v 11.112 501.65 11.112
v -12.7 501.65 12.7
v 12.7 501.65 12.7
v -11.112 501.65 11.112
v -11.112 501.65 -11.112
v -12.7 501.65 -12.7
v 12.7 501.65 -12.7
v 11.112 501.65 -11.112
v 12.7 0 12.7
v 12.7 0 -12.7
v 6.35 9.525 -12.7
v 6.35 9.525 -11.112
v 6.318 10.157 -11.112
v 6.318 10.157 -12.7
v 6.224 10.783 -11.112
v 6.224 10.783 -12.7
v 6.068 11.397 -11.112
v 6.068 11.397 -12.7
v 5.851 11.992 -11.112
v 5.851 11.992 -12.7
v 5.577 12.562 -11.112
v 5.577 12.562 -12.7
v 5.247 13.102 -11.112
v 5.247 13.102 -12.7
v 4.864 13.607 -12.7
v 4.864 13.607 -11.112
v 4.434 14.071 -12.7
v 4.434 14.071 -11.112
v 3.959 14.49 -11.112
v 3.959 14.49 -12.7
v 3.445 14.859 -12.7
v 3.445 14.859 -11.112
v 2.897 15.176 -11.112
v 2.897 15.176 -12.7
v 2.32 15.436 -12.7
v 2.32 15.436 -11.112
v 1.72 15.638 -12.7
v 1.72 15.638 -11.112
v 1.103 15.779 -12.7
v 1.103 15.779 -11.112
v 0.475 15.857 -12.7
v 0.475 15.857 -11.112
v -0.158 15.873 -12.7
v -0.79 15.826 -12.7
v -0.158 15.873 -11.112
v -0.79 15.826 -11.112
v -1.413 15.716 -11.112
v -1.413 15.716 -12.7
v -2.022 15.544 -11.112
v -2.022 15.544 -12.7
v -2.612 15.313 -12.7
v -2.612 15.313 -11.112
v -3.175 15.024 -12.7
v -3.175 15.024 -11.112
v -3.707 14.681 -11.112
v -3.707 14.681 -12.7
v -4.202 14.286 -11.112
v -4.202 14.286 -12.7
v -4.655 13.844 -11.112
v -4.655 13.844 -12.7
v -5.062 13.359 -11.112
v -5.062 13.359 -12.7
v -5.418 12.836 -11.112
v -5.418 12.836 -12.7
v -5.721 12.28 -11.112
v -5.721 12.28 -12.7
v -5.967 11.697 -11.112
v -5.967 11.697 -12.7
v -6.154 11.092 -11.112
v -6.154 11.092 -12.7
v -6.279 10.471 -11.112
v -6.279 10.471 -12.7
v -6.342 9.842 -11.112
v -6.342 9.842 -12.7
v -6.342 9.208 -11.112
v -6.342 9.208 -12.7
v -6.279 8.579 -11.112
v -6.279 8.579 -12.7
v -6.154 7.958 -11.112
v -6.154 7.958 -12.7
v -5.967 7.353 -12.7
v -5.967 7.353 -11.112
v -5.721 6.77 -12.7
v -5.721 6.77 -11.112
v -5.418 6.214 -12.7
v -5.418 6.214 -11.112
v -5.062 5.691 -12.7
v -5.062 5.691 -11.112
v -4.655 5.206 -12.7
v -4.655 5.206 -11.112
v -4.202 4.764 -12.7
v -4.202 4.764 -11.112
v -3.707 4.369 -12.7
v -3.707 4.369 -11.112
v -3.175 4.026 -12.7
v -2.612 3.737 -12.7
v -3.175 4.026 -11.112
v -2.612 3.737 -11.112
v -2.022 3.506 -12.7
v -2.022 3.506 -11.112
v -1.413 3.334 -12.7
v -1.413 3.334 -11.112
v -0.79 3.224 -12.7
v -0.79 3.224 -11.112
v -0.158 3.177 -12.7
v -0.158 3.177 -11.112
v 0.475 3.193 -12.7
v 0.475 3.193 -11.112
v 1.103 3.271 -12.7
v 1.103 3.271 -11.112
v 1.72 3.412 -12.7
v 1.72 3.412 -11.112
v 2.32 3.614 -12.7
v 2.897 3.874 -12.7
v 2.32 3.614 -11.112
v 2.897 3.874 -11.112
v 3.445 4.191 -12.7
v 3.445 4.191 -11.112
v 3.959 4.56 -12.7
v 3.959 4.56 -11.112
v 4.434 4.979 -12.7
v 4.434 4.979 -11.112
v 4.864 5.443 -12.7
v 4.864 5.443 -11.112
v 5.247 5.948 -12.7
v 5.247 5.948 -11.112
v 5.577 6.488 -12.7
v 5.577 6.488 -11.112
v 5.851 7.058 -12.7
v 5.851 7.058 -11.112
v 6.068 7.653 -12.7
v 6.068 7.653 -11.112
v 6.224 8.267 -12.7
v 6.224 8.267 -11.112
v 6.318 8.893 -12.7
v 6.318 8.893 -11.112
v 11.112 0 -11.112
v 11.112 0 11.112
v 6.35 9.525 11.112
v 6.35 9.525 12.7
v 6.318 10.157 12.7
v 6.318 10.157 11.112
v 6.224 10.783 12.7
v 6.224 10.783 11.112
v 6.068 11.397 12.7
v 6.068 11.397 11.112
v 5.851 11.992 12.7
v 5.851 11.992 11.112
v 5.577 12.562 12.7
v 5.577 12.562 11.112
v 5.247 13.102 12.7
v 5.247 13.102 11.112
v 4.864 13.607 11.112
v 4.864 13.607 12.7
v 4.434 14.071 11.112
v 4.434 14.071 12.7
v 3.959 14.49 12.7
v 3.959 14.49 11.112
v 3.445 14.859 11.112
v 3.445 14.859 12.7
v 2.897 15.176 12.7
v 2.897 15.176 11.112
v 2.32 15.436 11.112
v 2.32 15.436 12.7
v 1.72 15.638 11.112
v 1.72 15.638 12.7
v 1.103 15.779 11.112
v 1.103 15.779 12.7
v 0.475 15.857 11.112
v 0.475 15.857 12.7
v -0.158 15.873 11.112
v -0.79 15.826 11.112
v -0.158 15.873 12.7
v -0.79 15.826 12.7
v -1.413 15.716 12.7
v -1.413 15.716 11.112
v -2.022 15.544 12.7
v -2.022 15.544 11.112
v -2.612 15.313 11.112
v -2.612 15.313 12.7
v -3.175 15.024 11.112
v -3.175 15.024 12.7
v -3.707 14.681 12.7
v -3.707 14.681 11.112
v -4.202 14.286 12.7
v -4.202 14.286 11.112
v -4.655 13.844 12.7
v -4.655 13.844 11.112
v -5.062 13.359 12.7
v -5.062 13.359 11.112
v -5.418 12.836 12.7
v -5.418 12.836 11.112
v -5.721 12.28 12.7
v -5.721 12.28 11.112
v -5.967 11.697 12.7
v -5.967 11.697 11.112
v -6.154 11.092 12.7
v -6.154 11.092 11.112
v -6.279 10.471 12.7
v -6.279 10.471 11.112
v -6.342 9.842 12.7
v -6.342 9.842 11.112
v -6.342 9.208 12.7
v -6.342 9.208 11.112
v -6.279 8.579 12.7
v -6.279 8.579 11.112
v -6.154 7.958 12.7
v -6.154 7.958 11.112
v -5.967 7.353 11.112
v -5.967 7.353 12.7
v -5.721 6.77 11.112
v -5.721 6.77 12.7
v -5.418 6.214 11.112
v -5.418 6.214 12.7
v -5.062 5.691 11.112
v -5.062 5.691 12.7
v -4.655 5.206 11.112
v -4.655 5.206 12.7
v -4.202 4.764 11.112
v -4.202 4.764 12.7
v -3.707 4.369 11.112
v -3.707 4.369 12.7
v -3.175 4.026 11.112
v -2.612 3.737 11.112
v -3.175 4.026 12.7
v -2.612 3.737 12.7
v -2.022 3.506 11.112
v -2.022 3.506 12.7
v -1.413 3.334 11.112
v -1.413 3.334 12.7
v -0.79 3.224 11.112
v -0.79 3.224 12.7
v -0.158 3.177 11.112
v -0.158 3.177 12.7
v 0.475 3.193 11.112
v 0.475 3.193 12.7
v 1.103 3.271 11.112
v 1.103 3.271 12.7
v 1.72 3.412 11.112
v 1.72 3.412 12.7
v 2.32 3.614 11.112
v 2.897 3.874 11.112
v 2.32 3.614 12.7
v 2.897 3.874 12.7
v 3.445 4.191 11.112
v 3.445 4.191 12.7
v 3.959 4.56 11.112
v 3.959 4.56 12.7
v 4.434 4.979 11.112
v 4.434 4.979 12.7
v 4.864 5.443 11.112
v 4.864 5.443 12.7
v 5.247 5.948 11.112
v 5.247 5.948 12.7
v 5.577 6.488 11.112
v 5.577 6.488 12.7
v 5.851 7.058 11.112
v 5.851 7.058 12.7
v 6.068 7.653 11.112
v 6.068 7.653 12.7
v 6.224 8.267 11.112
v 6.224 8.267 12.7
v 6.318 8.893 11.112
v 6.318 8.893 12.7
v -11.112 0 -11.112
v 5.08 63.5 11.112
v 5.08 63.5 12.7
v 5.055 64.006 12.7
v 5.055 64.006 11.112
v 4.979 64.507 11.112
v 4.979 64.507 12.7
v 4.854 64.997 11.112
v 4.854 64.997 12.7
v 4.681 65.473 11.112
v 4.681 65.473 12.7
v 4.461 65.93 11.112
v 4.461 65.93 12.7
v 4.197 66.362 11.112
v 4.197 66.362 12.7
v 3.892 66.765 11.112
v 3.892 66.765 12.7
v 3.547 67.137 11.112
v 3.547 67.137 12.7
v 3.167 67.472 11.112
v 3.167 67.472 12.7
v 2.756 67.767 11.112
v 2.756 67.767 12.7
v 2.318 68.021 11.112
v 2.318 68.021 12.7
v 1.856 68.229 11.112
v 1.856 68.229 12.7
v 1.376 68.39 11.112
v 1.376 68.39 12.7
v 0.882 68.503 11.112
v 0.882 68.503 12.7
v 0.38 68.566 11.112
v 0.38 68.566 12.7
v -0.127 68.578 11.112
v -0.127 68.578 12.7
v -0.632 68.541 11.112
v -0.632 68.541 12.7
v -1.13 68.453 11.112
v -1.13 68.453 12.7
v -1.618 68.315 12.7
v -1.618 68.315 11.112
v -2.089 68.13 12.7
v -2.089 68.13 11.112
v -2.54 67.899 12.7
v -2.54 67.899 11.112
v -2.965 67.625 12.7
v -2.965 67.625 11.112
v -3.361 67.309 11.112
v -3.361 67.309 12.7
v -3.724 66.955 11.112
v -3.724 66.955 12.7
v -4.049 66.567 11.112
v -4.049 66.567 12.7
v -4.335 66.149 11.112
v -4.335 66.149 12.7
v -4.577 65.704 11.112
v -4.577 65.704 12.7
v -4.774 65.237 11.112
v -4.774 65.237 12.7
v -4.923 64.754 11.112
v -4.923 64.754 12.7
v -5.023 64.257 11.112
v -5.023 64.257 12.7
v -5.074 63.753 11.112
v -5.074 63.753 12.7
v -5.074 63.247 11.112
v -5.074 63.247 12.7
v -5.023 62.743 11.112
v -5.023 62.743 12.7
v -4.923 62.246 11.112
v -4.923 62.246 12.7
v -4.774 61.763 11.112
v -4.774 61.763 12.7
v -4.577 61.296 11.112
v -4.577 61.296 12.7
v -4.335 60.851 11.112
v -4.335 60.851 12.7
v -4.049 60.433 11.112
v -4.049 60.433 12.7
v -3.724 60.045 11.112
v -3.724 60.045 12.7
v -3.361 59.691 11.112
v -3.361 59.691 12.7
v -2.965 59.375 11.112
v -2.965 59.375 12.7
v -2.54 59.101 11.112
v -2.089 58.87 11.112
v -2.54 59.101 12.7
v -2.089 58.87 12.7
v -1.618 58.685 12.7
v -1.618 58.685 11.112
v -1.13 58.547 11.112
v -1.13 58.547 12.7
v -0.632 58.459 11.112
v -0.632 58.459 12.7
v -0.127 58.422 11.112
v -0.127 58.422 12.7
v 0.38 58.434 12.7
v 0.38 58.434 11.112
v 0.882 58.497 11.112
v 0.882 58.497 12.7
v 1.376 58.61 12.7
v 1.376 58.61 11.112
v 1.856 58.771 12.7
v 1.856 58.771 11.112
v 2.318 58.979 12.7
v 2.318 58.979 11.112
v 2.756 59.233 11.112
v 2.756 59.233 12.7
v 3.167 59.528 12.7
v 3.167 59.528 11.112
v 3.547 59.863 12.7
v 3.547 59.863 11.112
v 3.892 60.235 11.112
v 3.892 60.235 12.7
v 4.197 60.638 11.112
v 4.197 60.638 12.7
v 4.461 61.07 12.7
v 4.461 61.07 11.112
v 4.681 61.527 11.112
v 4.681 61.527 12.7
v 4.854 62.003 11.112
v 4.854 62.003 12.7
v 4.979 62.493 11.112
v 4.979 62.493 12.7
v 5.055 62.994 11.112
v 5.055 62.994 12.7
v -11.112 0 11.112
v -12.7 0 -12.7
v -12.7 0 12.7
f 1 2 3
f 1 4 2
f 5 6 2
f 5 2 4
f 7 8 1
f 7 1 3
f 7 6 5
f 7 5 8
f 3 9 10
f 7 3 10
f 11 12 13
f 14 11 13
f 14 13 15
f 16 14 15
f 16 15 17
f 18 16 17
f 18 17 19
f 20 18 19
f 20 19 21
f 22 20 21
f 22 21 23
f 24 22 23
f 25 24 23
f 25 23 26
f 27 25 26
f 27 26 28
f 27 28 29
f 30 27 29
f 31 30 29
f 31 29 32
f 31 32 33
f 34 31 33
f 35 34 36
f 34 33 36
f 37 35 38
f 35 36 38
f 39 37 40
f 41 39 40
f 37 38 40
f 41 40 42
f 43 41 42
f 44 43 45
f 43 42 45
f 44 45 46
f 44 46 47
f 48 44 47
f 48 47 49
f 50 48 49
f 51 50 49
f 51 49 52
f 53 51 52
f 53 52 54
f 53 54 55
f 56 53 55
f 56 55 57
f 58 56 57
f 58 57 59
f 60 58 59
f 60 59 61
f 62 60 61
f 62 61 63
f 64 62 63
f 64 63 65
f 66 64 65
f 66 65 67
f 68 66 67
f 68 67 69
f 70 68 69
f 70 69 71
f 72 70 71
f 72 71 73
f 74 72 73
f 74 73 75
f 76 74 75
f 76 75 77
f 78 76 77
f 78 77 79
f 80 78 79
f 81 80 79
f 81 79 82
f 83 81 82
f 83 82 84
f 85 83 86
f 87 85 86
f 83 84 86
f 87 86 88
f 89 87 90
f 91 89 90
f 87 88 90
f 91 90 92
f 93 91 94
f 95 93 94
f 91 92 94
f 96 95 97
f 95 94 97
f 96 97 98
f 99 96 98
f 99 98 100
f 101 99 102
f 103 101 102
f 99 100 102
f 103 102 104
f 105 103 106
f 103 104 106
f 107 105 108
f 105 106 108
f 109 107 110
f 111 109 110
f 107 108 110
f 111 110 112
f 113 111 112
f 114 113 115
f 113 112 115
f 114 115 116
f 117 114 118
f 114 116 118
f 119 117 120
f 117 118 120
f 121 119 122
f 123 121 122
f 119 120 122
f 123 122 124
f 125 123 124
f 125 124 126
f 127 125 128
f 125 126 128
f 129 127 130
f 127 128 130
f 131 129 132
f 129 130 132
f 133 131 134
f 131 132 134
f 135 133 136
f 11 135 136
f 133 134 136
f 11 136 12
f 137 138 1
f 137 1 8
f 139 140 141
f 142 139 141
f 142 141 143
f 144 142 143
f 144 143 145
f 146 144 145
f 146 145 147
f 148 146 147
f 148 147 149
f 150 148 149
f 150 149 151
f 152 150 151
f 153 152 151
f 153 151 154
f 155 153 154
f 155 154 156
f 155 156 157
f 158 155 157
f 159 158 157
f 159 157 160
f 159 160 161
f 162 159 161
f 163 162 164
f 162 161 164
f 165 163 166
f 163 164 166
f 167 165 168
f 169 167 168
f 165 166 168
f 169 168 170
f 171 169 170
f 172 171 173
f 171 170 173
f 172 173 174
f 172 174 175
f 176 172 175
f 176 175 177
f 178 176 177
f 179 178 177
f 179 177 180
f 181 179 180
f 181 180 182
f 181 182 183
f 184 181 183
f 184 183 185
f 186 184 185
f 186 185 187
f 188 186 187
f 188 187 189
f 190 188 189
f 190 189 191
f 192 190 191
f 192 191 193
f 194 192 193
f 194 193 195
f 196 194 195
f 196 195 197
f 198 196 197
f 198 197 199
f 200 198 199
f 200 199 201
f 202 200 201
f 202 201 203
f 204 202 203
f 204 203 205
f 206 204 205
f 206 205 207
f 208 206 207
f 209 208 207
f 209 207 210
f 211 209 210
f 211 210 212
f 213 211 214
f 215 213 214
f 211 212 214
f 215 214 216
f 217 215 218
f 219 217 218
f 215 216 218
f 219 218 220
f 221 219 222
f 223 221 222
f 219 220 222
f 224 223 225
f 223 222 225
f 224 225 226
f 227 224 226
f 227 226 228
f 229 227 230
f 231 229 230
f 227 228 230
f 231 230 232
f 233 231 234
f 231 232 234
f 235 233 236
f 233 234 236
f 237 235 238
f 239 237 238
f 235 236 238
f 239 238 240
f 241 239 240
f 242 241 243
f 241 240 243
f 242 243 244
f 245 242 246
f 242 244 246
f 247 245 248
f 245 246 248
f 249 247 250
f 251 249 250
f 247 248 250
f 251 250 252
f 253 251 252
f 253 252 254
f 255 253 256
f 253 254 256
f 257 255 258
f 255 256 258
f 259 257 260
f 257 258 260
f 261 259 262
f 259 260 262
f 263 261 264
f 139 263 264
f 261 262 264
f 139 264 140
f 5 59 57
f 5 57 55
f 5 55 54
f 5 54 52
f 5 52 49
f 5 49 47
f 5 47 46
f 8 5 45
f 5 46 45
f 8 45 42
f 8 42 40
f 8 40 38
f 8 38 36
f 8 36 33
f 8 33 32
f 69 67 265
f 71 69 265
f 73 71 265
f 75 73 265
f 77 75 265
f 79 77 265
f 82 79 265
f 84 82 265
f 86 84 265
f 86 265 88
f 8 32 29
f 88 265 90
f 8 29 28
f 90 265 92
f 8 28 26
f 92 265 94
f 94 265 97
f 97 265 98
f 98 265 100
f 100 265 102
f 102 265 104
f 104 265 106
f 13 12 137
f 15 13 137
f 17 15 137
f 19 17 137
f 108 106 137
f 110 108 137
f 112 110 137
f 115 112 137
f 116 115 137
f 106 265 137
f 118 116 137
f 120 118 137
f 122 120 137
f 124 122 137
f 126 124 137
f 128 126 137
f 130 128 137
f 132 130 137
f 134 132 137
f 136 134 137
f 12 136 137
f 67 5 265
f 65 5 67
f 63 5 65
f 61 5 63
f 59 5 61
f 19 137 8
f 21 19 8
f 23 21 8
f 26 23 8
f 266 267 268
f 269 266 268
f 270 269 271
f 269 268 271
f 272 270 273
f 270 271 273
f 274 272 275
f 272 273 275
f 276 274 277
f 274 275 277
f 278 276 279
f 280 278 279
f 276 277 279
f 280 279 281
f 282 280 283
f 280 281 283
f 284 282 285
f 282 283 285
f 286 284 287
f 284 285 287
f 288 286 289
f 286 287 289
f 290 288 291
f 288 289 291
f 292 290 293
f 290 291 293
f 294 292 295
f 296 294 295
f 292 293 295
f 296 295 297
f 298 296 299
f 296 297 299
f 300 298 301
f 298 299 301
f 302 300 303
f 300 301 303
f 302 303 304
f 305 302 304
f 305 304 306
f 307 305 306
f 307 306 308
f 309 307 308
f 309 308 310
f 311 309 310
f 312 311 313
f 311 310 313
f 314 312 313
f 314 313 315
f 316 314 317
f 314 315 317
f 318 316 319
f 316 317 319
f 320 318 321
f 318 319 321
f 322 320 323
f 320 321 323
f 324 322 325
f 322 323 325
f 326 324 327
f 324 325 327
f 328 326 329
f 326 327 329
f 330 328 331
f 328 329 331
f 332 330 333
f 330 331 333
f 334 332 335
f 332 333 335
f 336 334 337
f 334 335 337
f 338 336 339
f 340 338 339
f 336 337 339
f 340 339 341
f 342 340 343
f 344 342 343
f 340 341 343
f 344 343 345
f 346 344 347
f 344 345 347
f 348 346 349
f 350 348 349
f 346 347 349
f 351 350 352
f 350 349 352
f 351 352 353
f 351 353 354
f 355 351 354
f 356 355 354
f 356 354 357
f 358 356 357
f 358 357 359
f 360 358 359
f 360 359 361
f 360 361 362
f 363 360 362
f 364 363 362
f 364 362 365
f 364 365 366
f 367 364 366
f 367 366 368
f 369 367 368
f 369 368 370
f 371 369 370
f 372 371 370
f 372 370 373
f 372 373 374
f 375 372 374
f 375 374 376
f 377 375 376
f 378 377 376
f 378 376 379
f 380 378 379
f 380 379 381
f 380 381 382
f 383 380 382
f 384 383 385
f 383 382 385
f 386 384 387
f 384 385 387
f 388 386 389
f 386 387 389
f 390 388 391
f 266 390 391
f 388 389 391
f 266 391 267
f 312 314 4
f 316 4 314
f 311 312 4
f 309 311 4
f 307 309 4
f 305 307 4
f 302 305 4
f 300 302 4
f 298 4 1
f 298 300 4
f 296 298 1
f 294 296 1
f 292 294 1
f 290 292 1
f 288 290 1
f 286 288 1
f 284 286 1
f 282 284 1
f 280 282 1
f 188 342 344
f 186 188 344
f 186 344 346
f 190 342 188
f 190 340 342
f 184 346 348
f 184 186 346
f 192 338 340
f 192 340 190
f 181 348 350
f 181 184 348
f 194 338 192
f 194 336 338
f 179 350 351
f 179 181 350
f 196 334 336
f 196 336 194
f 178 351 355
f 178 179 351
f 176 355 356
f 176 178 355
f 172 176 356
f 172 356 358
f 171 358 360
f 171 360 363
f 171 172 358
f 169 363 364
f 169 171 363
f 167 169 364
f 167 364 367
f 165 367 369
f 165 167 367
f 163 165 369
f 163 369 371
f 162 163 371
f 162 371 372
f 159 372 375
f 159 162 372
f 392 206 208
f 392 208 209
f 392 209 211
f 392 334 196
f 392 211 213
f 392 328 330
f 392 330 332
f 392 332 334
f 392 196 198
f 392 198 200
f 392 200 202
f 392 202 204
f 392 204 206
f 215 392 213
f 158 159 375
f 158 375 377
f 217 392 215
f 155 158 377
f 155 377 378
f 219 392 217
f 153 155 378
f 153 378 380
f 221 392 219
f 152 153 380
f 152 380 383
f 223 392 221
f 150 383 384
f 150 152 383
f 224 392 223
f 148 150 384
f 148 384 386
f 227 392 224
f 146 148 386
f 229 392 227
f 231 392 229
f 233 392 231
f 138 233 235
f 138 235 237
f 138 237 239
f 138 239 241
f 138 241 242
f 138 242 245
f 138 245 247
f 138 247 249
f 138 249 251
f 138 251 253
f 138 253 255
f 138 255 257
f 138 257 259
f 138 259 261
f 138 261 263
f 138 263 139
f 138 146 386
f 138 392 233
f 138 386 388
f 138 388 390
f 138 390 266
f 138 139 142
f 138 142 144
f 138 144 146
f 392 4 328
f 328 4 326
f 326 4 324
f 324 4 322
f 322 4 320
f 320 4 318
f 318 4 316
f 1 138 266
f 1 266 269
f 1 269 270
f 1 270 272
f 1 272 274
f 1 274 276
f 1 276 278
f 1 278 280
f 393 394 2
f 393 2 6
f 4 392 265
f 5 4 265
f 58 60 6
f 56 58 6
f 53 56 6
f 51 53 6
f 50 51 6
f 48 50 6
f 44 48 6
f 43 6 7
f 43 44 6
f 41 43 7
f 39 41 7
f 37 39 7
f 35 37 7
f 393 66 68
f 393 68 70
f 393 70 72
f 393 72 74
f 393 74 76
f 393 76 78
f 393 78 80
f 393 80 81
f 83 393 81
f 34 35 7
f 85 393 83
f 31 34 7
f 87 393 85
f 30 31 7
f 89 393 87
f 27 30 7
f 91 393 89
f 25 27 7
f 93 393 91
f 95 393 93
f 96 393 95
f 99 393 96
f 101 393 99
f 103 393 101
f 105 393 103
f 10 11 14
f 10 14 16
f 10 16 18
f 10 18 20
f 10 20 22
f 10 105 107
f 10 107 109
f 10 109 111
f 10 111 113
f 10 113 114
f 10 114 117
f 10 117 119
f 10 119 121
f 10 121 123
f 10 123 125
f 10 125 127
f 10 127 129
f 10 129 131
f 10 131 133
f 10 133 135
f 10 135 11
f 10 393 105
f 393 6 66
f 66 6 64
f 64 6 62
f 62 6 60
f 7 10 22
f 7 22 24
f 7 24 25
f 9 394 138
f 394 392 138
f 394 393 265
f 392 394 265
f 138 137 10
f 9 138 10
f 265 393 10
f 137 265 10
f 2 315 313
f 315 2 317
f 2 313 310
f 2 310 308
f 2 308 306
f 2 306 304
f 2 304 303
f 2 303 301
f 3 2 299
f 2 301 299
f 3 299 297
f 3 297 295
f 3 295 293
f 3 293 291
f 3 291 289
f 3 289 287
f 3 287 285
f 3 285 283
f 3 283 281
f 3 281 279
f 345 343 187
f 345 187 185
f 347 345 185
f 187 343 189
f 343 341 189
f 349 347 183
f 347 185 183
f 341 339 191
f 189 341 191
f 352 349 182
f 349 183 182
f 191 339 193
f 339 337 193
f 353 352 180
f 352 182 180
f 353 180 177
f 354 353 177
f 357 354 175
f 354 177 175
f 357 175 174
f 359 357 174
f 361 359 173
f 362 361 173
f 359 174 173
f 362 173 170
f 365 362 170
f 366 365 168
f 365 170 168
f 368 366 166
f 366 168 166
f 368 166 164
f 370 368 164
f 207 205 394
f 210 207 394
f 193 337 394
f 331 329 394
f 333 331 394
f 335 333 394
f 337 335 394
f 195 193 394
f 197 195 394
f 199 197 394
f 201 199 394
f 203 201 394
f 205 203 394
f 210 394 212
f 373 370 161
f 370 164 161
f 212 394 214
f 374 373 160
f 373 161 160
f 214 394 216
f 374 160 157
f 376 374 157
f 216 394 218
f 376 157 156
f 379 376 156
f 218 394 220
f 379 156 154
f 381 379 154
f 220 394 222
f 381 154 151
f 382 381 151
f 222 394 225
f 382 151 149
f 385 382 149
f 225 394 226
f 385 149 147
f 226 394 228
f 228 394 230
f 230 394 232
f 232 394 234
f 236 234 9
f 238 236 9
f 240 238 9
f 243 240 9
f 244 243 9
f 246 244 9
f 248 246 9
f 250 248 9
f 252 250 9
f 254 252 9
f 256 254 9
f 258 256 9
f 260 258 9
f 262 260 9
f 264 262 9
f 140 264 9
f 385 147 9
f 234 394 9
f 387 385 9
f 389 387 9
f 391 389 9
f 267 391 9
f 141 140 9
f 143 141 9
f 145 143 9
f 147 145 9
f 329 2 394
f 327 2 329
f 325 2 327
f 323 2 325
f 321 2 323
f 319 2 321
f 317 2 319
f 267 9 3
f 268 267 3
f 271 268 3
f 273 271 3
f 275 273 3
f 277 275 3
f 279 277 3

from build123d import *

# Parameters (mm, degrees)
SKETCH1_W           = 25.4
SKETCH1_H           = 25.4
SKETCH1_W_2         = 22.225
SKETCH1_H_2         = 22.225
BOSS_EXTRUDE1_DEPTH = 501.65
SKETCH4_R           = 6.35
CUT_EXTRUDE1_DEPTH  = 26.4
SKETCH7_R           = 5.08
CUT_EXTRUDE3_DEPTH  = 1.5875


with BuildPart() as part:
    # Sketch1 → Boss-Extrude1 (new body)
    with BuildSketch(Plane(origin=(0, 0, 0), x_dir=(1, 0, 0), z_dir=(0, 1, 0))):
        Rectangle(SKETCH1_W, SKETCH1_H)
        Rectangle(SKETCH1_W_2, SKETCH1_H_2, mode=Mode.SUBTRACT)
    extrude(amount=BOSS_EXTRUDE1_DEPTH)

    # Sketch4 → Cut-Extrude1 (cut, through all)
    with BuildSketch(Plane.XY.offset(12.7)):
        with Locations((0, 9.525)):
            Circle(SKETCH4_R)
    extrude(amount=-CUT_EXTRUDE1_DEPTH, mode=Mode.SUBTRACT)

    # Sketch7 → Cut-Extrude3 (cut)
    with BuildSketch(Plane.XY.offset(12.7)):
        with Locations((0, 63.5)):
            Circle(SKETCH7_R)
    extrude(amount=-CUT_EXTRUDE3_DEPTH, mode=Mode.SUBTRACT)


solid = part.part
